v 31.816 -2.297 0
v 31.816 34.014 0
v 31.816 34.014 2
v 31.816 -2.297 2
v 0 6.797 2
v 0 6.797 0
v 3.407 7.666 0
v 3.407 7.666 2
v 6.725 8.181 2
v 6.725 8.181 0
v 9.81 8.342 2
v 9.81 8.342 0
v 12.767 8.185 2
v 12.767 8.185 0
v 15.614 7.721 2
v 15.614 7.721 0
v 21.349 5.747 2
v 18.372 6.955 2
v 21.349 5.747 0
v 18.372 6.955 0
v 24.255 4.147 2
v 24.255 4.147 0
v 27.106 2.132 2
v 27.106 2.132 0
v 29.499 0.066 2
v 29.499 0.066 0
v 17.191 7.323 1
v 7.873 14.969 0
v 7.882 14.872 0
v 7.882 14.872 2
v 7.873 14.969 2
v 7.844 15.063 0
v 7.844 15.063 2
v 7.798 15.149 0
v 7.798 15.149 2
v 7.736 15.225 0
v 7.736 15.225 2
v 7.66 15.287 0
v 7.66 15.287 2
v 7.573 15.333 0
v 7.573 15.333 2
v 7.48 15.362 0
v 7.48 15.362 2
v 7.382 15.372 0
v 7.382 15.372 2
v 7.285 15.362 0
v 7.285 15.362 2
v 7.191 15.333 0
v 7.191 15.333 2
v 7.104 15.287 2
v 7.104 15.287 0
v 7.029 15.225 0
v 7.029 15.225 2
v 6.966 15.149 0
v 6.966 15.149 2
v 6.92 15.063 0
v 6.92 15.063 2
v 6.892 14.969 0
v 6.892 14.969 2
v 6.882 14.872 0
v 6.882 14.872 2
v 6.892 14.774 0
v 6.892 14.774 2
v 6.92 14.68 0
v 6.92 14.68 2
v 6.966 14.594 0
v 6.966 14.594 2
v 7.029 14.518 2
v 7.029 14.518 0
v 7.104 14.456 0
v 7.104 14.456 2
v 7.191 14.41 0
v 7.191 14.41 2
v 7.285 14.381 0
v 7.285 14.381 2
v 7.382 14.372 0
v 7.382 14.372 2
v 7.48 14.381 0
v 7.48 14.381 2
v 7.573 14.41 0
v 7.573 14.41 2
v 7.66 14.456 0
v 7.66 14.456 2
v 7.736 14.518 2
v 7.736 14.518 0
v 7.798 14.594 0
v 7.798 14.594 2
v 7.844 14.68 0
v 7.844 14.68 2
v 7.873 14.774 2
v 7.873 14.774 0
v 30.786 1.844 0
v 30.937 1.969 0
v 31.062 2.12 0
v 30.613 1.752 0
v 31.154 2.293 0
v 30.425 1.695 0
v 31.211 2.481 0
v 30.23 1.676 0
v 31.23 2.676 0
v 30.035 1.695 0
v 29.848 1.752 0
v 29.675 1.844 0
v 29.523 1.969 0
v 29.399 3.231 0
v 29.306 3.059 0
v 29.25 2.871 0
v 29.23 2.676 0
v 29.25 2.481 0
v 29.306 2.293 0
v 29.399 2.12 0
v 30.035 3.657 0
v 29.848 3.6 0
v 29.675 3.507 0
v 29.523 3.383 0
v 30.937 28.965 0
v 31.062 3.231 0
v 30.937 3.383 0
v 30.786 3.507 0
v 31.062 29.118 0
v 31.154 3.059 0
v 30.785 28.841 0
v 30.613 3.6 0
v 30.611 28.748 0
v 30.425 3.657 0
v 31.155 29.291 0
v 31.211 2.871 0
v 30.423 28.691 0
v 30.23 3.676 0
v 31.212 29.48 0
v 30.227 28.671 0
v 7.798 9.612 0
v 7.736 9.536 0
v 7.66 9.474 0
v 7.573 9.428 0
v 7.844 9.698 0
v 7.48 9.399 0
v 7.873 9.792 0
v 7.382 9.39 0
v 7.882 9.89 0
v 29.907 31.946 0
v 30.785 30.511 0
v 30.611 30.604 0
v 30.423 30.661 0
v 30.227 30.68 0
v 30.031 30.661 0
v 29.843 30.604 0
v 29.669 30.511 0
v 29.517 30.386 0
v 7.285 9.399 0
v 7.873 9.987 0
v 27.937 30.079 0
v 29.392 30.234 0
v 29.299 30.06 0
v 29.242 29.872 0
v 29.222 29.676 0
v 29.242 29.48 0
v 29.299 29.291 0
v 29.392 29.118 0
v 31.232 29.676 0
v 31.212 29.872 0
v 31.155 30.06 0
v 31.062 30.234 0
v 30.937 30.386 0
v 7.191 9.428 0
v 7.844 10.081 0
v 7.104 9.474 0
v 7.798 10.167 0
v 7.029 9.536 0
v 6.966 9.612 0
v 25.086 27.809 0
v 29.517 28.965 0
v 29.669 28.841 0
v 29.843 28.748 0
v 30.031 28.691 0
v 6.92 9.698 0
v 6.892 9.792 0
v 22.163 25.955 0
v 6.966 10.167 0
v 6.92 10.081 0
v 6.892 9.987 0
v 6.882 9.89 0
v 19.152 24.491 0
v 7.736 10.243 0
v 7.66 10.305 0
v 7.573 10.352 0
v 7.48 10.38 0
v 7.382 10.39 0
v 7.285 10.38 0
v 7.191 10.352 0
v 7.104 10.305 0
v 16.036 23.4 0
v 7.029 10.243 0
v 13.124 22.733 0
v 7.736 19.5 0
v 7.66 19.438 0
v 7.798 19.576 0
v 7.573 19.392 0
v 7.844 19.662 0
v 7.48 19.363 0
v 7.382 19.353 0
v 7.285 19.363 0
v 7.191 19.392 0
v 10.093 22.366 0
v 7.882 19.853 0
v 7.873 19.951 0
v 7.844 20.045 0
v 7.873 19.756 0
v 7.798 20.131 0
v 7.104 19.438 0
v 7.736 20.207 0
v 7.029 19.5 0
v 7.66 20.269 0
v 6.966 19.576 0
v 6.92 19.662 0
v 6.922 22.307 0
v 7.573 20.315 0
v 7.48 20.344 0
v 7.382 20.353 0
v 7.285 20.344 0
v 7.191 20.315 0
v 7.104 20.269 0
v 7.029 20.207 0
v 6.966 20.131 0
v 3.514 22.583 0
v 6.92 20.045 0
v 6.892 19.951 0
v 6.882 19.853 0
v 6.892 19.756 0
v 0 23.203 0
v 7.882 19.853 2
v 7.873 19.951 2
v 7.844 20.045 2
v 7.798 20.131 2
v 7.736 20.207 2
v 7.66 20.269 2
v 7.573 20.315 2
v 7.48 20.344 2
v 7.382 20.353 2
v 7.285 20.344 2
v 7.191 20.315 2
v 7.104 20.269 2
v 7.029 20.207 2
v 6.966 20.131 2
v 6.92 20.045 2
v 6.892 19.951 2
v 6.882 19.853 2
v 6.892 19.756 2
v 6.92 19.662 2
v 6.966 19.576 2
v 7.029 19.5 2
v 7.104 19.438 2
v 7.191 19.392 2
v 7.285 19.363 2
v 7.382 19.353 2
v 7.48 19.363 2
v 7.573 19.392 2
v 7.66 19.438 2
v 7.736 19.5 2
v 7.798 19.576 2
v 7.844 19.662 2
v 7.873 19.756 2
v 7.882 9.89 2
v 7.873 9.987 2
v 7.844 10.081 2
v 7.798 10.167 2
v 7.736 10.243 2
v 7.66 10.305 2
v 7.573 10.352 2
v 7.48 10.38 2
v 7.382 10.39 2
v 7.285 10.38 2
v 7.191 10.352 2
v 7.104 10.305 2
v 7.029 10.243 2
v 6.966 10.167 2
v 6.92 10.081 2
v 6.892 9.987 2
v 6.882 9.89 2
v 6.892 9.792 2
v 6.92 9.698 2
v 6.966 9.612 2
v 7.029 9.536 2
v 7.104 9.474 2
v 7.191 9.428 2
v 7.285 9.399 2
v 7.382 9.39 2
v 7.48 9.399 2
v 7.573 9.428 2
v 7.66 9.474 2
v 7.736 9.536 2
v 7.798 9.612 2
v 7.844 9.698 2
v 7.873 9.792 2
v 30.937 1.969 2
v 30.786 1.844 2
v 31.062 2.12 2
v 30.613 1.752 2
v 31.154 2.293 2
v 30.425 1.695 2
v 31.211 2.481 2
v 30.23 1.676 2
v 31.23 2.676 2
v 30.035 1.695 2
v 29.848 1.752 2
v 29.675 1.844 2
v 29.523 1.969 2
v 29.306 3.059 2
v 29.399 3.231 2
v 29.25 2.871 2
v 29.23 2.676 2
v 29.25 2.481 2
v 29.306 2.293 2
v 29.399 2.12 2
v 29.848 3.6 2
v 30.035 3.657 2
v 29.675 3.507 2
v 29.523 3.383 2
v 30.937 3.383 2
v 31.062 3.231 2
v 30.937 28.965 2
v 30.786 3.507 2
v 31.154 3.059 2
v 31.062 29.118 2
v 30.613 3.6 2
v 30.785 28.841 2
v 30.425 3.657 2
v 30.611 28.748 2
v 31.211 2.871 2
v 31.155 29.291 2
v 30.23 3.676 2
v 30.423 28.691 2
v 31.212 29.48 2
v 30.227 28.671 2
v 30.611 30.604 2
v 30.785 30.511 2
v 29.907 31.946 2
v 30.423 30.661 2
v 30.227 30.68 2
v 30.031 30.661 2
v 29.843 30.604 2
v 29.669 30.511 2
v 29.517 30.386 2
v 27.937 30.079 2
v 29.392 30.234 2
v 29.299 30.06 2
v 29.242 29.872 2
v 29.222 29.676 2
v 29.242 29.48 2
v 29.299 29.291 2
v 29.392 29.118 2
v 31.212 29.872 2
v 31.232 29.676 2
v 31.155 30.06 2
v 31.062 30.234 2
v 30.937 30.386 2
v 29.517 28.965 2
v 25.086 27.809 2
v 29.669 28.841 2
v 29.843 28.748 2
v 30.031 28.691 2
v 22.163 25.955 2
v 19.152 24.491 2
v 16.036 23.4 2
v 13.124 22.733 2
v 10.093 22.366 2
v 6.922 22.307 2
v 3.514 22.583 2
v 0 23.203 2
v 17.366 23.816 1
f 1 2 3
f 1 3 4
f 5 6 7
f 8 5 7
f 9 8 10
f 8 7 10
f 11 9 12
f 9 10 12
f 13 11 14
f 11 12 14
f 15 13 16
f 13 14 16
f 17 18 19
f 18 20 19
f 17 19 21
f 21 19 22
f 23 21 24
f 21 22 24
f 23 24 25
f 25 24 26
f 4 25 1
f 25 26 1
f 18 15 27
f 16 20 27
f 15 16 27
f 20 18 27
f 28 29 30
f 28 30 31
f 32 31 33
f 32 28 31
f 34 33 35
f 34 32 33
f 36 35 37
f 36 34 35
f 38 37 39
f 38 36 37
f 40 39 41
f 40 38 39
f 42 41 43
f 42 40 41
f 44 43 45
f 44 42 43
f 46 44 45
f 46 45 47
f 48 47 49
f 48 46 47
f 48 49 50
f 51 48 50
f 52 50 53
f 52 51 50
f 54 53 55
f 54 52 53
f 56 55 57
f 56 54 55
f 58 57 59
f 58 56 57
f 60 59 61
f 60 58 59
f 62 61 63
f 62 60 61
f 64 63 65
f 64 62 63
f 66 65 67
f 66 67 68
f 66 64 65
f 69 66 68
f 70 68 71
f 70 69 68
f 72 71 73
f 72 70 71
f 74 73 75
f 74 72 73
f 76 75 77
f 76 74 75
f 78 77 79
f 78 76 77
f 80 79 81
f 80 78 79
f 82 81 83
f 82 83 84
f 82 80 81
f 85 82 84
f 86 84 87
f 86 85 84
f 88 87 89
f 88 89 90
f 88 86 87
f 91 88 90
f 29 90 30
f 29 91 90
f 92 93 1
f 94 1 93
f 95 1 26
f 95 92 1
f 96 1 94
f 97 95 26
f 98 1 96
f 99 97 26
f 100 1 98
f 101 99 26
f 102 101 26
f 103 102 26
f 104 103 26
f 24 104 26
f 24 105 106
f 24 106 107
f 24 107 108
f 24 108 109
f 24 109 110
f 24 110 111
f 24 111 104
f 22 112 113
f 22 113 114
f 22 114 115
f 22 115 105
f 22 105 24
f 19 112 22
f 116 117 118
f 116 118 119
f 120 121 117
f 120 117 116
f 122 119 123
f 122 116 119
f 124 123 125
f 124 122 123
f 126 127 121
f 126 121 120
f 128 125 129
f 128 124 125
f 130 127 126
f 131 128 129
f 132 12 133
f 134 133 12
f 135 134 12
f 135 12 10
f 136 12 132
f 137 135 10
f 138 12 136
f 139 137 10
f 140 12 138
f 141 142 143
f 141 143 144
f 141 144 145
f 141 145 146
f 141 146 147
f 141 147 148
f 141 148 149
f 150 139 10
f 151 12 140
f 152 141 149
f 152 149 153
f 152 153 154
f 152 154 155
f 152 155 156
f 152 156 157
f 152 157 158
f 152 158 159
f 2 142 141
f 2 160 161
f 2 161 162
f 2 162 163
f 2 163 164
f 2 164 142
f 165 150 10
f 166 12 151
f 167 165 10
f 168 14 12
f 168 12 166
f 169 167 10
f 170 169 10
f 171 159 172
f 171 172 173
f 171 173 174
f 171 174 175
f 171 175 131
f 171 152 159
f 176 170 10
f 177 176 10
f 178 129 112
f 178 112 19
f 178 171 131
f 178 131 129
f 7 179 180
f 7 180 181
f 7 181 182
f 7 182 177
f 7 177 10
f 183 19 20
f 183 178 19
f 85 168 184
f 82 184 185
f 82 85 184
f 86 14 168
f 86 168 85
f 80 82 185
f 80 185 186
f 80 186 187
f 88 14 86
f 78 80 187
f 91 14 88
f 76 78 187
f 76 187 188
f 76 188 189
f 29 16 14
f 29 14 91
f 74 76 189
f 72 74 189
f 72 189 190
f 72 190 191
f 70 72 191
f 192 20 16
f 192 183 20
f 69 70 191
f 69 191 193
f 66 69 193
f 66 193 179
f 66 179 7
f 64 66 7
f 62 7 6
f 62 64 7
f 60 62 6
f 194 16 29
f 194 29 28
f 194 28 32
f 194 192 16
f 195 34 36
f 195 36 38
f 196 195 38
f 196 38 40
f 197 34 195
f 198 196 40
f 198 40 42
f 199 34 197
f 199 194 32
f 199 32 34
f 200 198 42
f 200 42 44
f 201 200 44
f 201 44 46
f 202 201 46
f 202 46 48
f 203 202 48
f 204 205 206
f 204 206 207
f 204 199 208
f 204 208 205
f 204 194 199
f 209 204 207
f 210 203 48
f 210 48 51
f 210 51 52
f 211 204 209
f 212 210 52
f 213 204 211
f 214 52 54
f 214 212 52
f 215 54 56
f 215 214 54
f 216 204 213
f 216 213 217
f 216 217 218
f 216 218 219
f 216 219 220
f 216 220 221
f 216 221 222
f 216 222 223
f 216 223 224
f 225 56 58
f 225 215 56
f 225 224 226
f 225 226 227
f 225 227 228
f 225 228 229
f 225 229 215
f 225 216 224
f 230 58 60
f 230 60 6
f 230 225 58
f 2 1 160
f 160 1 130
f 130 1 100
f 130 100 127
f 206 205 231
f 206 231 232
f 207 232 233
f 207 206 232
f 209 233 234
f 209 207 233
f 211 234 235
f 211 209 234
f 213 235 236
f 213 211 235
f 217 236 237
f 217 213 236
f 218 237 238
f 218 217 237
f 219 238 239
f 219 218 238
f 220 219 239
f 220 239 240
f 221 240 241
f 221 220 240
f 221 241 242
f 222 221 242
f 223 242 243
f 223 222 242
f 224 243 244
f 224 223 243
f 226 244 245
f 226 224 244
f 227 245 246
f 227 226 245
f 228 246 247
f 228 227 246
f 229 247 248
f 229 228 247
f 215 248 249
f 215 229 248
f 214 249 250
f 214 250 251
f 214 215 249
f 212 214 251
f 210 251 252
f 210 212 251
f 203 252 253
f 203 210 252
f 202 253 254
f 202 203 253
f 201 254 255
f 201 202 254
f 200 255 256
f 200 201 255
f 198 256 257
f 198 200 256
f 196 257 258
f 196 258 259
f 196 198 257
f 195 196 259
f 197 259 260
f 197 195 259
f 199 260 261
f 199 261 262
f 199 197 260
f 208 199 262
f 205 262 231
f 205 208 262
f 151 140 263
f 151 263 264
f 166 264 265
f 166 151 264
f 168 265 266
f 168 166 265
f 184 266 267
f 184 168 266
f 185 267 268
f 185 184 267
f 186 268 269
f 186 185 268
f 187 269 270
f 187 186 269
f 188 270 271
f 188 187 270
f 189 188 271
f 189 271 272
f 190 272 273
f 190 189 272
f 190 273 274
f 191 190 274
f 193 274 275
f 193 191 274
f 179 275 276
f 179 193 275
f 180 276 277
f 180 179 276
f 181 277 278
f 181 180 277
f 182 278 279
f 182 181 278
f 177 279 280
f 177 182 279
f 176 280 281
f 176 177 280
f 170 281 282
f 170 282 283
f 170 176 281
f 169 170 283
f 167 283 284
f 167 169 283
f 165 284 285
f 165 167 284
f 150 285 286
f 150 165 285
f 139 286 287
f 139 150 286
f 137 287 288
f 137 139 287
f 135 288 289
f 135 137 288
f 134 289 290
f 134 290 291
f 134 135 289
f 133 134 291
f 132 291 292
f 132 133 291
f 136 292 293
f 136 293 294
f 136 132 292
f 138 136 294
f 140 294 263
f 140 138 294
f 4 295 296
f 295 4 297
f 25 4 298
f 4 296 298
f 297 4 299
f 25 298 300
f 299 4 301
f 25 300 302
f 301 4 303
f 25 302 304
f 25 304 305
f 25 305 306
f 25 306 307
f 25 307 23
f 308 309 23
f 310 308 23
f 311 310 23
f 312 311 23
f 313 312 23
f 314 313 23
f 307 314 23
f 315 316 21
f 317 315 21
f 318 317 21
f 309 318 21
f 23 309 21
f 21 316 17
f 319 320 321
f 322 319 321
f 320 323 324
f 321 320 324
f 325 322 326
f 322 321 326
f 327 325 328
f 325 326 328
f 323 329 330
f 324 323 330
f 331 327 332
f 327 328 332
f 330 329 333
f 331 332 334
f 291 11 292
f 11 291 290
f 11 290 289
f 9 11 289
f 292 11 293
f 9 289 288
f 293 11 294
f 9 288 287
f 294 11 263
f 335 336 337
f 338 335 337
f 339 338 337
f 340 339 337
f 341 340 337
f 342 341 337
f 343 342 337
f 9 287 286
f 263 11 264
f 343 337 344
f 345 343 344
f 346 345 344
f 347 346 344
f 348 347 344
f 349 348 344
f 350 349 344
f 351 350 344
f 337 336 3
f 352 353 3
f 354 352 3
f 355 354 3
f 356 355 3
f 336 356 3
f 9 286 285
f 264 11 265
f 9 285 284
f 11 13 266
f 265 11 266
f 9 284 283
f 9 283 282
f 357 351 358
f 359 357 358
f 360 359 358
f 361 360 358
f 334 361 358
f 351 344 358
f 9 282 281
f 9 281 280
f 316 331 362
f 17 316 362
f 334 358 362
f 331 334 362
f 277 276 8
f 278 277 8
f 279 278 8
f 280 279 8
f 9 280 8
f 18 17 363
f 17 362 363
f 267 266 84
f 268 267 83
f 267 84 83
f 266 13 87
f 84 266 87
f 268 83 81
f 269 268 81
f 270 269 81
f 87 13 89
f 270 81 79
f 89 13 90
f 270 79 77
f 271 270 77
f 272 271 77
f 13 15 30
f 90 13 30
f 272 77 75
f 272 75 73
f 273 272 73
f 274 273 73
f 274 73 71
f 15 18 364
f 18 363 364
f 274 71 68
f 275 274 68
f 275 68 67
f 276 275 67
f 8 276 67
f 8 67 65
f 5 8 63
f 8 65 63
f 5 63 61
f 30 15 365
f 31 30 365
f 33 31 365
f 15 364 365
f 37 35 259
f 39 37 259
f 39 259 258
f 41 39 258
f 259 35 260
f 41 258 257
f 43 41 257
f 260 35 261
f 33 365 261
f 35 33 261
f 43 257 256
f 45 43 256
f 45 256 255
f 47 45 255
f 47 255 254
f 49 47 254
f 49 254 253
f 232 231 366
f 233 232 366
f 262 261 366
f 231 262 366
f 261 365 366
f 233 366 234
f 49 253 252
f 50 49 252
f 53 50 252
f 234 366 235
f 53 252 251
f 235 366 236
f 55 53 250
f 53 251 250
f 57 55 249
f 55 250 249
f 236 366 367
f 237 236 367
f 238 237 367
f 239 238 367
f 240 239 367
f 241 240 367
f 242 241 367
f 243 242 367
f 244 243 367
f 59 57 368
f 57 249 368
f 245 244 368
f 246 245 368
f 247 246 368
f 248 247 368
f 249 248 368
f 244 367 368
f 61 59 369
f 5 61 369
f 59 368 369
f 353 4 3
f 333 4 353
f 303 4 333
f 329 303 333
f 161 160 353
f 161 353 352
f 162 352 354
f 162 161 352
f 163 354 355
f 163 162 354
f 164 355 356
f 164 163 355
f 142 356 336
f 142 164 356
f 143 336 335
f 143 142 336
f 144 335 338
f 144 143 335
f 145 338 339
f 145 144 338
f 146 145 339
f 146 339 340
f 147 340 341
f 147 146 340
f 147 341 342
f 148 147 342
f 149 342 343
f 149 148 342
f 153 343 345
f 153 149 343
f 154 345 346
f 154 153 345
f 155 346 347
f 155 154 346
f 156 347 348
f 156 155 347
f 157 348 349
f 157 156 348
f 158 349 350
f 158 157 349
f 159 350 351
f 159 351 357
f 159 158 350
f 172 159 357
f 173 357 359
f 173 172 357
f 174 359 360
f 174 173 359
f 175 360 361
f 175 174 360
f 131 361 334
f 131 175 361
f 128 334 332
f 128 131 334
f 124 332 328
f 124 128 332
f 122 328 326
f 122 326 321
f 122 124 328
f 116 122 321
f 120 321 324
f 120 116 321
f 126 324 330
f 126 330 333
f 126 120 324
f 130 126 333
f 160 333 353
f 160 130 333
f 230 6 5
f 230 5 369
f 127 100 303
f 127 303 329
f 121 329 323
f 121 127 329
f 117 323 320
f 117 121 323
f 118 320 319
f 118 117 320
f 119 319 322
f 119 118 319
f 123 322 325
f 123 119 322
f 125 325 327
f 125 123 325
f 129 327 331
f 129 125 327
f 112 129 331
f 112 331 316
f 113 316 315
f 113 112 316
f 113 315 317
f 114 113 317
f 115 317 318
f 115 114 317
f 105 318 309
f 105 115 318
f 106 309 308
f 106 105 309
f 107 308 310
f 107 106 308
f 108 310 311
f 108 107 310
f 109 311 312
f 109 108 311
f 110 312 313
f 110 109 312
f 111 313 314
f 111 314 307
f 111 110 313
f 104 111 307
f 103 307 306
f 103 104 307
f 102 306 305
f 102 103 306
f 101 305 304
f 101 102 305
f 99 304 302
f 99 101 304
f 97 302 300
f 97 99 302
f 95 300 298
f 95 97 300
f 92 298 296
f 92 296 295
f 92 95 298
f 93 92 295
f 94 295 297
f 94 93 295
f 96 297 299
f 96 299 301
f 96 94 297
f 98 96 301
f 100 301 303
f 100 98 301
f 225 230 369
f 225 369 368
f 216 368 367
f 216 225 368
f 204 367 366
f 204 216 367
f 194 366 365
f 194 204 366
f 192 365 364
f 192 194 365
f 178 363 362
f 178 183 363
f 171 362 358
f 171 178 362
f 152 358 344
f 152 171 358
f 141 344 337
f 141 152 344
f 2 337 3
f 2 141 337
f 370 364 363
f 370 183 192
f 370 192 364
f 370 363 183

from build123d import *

# Parameters (mm, degrees)
SKETCH1_R           = 0.5
SKETCH1_R_2         = 1.004584714
SKETCH1_R_3         = 1
BOSS_EXTRUDE4_DEPTH = 2


with BuildPart() as part:
    # Sketch1 → Boss-Extrude4 (new body)
    with BuildSketch(Plane.XY):
        with BuildLine():
            Line((0, 6.796629536), (0, 23.203370382))
            add(Edge.make_bspline(
                [(0, 23.203370382), (18.824108825, 19.022876047), (31.816291347, 34.013726018)],
                knots=[0, 0, 0, 1, 1, 1], degree=2))
            Line((31.816291347, 34.013726018), (31.816291347, -2.297085155))
            add(Edge.make_bspline(
                [(0, 6.796629536), (18.47321861, 12.396952678), (31.816291347, -2.297085155)],
                knots=[0, 0, 0, 1, 1, 1], degree=2))
        make_face()
        with Locations((7.382147853, 19.853448191)):
            Circle(SKETCH1_R, mode=Mode.SUBTRACT)
        with Locations((7.382147853, 9.889606803)):
            Circle(SKETCH1_R, mode=Mode.SUBTRACT)
        with Locations((7.382147853, 14.871527497)):
            Circle(SKETCH1_R, mode=Mode.SUBTRACT)
        with Locations((30.227051082, 29.675836966)):
            Circle(SKETCH1_R_2, mode=Mode.SUBTRACT)
        with Locations((30.230334009, 2.675837166)):
            Circle(SKETCH1_R_3, mode=Mode.SUBTRACT)
    extrude(amount=BOSS_EXTRUDE4_DEPTH)


solid = part.part
